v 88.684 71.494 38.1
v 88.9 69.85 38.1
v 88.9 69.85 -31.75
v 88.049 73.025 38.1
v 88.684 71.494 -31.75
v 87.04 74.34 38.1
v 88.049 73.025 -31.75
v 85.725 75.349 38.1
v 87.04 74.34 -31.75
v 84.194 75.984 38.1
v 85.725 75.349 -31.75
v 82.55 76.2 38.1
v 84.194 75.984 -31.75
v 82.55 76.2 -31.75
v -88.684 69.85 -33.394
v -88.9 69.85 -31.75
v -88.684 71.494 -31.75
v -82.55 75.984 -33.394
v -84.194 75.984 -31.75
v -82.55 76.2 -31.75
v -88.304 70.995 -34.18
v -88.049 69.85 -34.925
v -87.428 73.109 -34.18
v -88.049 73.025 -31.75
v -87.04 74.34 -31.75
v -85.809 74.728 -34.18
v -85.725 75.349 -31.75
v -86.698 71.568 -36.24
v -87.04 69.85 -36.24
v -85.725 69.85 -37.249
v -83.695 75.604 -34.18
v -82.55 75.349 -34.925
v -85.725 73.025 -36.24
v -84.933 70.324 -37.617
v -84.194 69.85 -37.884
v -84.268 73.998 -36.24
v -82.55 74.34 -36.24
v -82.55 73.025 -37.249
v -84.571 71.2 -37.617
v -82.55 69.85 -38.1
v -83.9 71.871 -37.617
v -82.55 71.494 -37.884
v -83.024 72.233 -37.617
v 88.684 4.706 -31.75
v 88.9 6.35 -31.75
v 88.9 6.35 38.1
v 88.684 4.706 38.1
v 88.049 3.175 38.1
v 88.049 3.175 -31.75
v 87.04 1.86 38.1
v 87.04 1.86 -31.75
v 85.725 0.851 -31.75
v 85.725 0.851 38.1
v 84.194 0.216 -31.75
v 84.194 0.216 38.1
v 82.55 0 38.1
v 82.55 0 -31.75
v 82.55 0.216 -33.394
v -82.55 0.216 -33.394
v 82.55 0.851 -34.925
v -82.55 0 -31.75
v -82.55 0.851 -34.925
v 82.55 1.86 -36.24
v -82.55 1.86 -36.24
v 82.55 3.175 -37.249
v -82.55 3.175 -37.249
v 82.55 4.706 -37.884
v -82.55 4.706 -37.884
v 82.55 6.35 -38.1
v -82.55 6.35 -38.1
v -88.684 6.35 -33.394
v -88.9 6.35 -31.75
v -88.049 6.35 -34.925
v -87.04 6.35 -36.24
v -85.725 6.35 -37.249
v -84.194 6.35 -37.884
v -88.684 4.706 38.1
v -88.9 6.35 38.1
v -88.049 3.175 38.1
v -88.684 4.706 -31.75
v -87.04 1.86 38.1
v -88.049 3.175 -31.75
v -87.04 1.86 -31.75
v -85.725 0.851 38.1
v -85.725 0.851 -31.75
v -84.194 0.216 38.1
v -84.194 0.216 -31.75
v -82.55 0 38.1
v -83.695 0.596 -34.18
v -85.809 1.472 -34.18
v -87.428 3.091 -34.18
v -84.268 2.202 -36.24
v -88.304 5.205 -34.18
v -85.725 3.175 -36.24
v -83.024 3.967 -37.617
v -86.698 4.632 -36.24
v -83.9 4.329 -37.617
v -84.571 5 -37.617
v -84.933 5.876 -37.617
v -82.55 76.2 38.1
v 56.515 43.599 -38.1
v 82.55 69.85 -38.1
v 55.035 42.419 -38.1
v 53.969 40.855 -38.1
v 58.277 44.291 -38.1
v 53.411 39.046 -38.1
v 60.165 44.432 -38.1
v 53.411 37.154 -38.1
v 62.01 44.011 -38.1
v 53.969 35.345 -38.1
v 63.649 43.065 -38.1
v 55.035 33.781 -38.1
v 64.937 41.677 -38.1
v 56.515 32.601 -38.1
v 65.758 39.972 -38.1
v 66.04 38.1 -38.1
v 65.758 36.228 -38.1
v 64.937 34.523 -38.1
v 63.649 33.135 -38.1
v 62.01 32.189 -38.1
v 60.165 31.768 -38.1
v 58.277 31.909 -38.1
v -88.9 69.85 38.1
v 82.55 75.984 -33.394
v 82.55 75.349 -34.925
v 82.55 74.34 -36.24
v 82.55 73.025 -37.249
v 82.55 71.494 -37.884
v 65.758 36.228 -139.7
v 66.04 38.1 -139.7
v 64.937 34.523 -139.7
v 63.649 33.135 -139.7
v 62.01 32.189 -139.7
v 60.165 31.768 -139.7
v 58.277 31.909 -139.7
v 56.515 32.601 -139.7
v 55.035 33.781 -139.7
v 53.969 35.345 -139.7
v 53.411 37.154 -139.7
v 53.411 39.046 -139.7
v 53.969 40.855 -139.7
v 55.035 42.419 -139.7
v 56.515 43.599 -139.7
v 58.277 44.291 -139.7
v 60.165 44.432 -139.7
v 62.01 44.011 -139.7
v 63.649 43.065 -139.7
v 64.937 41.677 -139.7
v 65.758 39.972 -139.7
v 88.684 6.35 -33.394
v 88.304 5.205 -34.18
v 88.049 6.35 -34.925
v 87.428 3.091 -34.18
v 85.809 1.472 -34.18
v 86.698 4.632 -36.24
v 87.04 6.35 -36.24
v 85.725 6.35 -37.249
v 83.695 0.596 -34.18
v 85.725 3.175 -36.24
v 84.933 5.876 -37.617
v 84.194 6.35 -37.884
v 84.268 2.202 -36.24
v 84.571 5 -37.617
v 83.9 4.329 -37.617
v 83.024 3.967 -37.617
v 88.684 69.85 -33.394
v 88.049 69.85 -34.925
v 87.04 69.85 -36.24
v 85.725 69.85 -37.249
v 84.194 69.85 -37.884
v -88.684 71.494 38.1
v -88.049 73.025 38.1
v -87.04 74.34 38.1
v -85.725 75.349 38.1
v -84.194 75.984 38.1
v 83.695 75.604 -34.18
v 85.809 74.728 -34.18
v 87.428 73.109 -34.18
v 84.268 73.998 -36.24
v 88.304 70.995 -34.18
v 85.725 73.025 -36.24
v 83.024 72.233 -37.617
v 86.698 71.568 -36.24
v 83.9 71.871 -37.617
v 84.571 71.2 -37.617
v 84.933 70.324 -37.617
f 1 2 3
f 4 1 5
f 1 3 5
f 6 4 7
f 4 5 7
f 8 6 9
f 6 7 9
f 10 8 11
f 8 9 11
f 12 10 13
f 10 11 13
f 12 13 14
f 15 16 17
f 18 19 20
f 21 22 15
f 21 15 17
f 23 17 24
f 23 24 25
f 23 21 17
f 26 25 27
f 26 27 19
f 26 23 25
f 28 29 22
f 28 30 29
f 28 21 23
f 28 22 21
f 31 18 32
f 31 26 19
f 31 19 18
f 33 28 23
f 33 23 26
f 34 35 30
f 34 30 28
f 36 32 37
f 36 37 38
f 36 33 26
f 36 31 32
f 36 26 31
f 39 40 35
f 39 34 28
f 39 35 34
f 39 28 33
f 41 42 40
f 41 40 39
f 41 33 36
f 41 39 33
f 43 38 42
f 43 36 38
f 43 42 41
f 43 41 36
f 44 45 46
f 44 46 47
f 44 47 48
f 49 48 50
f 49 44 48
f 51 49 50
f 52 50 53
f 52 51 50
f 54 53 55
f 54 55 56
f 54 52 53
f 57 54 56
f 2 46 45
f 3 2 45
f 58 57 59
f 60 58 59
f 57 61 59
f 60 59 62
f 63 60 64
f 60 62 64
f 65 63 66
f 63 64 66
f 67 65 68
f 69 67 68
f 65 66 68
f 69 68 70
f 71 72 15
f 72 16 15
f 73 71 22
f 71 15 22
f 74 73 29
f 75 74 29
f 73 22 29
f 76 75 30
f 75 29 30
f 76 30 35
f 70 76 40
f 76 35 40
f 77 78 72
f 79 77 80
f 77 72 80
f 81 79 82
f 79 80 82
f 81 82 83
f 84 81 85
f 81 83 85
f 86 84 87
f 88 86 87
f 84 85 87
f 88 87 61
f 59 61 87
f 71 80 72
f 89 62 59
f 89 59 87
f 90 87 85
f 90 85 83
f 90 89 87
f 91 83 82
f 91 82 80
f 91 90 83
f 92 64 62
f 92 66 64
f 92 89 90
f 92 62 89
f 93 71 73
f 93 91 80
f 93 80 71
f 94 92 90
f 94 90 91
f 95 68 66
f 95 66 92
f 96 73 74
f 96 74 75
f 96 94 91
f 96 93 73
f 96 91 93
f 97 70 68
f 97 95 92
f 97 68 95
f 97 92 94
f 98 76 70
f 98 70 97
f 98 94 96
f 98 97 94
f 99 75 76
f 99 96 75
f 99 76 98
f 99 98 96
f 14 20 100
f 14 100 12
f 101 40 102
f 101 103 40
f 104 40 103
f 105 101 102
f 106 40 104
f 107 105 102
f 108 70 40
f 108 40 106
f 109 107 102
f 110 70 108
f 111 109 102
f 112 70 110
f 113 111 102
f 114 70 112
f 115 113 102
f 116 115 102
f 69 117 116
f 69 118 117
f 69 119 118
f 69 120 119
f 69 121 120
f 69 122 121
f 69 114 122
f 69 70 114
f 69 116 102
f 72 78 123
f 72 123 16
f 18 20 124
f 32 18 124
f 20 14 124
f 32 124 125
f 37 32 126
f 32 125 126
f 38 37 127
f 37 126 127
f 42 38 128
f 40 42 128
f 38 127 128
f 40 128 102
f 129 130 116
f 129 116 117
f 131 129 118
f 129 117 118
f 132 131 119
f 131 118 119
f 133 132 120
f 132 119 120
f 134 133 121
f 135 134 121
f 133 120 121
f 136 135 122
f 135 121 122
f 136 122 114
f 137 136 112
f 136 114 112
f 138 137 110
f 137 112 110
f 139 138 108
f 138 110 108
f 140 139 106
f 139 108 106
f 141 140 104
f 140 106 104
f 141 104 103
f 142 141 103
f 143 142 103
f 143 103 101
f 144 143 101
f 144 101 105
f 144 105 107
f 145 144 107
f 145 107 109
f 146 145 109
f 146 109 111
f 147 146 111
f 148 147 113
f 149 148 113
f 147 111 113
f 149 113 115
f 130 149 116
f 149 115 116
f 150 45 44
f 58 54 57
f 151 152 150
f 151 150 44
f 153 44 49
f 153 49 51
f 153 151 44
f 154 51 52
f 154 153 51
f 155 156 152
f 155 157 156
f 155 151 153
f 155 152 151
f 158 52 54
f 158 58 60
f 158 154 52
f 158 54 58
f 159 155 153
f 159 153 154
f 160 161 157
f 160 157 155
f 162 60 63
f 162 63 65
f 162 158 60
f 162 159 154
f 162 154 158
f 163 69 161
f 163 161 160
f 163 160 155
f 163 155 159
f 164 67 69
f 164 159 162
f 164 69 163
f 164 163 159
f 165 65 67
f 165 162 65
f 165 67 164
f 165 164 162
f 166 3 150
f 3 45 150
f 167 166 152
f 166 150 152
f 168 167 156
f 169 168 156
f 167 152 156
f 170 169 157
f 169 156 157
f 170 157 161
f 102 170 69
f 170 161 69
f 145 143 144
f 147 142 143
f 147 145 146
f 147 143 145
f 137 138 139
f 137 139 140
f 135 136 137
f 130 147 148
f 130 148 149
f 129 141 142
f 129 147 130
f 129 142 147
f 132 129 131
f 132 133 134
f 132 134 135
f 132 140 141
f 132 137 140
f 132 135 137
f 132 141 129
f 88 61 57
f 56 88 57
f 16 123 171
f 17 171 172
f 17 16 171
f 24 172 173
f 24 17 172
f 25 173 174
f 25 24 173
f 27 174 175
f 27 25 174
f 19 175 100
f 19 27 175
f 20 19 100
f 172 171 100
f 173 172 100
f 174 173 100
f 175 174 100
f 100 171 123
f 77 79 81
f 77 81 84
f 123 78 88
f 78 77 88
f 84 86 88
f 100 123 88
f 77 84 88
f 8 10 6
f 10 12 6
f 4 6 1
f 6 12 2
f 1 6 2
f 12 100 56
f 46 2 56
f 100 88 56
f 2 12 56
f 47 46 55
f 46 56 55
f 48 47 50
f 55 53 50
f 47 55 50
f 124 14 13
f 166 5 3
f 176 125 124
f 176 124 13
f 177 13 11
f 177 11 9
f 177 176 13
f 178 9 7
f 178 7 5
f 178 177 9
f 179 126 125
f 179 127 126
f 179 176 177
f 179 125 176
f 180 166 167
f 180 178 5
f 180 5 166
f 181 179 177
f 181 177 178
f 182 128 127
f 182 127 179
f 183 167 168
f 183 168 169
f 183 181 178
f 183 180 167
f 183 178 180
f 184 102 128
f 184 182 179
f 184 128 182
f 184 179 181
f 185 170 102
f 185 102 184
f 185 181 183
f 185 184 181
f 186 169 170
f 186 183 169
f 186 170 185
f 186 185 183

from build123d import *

# Parameters (mm, degrees)
SKETCH1_W           = 177.8
SKETCH1_H           = 76.2
BOSS_EXTRUDE1_DEPTH = 76.2
FILLET1_R           = 6.35
SKETCH2_R           = 6.35
BOSS_EXTRUDE2_DEPTH = 101.6
FILLET2_R           = 6.35


with BuildPart() as part:
    # Sketch1 → Boss-Extrude1 (new body)
    with BuildSketch(Plane(origin=(0, 0, 0), x_dir=(1, 0, 0), z_dir=(0, 1, 0))):
        Rectangle(SKETCH1_W, SKETCH1_H)
    extrude(amount=BOSS_EXTRUDE1_DEPTH)

    # Fillet1
    fillet1_edges = [part.edges().sort_by_distance(p)[0] for p in [
        (88.9, 76.2, 0),
        (-88.9, 76.2, 0),
        (88.9, 0, 0),
        (-88.9, 0, 0),
    ]]
    fillet(fillet1_edges, radius=FILLET1_R)

    # Sketch2 → Boss-Extrude2 (add)
    with BuildSketch(Plane(origin=(0, 0, -38.1), x_dir=(-1, 0, 0), z_dir=(0, 0, -1))):
        with Locations(Location((-59.69, 38.1, 0), (0, 0, 180))):
            Circle(SKETCH2_R)
    extrude(amount=BOSS_EXTRUDE2_DEPTH)

    # Fillet2
    fillet2_edges = [part.edges().sort_by_distance(p)[0] for p in [
        (-88.9, 38.1, -38.1),
        (0, 0, -38.1),
        (0, 76.2, -38.1),
        (88.9, 38.1, -38.1),
        (87.040128061, 74.340128061, -38.1),
        (-87.040128061, 74.340128061, -38.1),
        (87.040128061, 1.859871939, -38.1),
        (-87.040128061, 1.859871939, -38.1),
    ]]
    fillet(fillet2_edges, radius=FILLET2_R)


solid = part.part
